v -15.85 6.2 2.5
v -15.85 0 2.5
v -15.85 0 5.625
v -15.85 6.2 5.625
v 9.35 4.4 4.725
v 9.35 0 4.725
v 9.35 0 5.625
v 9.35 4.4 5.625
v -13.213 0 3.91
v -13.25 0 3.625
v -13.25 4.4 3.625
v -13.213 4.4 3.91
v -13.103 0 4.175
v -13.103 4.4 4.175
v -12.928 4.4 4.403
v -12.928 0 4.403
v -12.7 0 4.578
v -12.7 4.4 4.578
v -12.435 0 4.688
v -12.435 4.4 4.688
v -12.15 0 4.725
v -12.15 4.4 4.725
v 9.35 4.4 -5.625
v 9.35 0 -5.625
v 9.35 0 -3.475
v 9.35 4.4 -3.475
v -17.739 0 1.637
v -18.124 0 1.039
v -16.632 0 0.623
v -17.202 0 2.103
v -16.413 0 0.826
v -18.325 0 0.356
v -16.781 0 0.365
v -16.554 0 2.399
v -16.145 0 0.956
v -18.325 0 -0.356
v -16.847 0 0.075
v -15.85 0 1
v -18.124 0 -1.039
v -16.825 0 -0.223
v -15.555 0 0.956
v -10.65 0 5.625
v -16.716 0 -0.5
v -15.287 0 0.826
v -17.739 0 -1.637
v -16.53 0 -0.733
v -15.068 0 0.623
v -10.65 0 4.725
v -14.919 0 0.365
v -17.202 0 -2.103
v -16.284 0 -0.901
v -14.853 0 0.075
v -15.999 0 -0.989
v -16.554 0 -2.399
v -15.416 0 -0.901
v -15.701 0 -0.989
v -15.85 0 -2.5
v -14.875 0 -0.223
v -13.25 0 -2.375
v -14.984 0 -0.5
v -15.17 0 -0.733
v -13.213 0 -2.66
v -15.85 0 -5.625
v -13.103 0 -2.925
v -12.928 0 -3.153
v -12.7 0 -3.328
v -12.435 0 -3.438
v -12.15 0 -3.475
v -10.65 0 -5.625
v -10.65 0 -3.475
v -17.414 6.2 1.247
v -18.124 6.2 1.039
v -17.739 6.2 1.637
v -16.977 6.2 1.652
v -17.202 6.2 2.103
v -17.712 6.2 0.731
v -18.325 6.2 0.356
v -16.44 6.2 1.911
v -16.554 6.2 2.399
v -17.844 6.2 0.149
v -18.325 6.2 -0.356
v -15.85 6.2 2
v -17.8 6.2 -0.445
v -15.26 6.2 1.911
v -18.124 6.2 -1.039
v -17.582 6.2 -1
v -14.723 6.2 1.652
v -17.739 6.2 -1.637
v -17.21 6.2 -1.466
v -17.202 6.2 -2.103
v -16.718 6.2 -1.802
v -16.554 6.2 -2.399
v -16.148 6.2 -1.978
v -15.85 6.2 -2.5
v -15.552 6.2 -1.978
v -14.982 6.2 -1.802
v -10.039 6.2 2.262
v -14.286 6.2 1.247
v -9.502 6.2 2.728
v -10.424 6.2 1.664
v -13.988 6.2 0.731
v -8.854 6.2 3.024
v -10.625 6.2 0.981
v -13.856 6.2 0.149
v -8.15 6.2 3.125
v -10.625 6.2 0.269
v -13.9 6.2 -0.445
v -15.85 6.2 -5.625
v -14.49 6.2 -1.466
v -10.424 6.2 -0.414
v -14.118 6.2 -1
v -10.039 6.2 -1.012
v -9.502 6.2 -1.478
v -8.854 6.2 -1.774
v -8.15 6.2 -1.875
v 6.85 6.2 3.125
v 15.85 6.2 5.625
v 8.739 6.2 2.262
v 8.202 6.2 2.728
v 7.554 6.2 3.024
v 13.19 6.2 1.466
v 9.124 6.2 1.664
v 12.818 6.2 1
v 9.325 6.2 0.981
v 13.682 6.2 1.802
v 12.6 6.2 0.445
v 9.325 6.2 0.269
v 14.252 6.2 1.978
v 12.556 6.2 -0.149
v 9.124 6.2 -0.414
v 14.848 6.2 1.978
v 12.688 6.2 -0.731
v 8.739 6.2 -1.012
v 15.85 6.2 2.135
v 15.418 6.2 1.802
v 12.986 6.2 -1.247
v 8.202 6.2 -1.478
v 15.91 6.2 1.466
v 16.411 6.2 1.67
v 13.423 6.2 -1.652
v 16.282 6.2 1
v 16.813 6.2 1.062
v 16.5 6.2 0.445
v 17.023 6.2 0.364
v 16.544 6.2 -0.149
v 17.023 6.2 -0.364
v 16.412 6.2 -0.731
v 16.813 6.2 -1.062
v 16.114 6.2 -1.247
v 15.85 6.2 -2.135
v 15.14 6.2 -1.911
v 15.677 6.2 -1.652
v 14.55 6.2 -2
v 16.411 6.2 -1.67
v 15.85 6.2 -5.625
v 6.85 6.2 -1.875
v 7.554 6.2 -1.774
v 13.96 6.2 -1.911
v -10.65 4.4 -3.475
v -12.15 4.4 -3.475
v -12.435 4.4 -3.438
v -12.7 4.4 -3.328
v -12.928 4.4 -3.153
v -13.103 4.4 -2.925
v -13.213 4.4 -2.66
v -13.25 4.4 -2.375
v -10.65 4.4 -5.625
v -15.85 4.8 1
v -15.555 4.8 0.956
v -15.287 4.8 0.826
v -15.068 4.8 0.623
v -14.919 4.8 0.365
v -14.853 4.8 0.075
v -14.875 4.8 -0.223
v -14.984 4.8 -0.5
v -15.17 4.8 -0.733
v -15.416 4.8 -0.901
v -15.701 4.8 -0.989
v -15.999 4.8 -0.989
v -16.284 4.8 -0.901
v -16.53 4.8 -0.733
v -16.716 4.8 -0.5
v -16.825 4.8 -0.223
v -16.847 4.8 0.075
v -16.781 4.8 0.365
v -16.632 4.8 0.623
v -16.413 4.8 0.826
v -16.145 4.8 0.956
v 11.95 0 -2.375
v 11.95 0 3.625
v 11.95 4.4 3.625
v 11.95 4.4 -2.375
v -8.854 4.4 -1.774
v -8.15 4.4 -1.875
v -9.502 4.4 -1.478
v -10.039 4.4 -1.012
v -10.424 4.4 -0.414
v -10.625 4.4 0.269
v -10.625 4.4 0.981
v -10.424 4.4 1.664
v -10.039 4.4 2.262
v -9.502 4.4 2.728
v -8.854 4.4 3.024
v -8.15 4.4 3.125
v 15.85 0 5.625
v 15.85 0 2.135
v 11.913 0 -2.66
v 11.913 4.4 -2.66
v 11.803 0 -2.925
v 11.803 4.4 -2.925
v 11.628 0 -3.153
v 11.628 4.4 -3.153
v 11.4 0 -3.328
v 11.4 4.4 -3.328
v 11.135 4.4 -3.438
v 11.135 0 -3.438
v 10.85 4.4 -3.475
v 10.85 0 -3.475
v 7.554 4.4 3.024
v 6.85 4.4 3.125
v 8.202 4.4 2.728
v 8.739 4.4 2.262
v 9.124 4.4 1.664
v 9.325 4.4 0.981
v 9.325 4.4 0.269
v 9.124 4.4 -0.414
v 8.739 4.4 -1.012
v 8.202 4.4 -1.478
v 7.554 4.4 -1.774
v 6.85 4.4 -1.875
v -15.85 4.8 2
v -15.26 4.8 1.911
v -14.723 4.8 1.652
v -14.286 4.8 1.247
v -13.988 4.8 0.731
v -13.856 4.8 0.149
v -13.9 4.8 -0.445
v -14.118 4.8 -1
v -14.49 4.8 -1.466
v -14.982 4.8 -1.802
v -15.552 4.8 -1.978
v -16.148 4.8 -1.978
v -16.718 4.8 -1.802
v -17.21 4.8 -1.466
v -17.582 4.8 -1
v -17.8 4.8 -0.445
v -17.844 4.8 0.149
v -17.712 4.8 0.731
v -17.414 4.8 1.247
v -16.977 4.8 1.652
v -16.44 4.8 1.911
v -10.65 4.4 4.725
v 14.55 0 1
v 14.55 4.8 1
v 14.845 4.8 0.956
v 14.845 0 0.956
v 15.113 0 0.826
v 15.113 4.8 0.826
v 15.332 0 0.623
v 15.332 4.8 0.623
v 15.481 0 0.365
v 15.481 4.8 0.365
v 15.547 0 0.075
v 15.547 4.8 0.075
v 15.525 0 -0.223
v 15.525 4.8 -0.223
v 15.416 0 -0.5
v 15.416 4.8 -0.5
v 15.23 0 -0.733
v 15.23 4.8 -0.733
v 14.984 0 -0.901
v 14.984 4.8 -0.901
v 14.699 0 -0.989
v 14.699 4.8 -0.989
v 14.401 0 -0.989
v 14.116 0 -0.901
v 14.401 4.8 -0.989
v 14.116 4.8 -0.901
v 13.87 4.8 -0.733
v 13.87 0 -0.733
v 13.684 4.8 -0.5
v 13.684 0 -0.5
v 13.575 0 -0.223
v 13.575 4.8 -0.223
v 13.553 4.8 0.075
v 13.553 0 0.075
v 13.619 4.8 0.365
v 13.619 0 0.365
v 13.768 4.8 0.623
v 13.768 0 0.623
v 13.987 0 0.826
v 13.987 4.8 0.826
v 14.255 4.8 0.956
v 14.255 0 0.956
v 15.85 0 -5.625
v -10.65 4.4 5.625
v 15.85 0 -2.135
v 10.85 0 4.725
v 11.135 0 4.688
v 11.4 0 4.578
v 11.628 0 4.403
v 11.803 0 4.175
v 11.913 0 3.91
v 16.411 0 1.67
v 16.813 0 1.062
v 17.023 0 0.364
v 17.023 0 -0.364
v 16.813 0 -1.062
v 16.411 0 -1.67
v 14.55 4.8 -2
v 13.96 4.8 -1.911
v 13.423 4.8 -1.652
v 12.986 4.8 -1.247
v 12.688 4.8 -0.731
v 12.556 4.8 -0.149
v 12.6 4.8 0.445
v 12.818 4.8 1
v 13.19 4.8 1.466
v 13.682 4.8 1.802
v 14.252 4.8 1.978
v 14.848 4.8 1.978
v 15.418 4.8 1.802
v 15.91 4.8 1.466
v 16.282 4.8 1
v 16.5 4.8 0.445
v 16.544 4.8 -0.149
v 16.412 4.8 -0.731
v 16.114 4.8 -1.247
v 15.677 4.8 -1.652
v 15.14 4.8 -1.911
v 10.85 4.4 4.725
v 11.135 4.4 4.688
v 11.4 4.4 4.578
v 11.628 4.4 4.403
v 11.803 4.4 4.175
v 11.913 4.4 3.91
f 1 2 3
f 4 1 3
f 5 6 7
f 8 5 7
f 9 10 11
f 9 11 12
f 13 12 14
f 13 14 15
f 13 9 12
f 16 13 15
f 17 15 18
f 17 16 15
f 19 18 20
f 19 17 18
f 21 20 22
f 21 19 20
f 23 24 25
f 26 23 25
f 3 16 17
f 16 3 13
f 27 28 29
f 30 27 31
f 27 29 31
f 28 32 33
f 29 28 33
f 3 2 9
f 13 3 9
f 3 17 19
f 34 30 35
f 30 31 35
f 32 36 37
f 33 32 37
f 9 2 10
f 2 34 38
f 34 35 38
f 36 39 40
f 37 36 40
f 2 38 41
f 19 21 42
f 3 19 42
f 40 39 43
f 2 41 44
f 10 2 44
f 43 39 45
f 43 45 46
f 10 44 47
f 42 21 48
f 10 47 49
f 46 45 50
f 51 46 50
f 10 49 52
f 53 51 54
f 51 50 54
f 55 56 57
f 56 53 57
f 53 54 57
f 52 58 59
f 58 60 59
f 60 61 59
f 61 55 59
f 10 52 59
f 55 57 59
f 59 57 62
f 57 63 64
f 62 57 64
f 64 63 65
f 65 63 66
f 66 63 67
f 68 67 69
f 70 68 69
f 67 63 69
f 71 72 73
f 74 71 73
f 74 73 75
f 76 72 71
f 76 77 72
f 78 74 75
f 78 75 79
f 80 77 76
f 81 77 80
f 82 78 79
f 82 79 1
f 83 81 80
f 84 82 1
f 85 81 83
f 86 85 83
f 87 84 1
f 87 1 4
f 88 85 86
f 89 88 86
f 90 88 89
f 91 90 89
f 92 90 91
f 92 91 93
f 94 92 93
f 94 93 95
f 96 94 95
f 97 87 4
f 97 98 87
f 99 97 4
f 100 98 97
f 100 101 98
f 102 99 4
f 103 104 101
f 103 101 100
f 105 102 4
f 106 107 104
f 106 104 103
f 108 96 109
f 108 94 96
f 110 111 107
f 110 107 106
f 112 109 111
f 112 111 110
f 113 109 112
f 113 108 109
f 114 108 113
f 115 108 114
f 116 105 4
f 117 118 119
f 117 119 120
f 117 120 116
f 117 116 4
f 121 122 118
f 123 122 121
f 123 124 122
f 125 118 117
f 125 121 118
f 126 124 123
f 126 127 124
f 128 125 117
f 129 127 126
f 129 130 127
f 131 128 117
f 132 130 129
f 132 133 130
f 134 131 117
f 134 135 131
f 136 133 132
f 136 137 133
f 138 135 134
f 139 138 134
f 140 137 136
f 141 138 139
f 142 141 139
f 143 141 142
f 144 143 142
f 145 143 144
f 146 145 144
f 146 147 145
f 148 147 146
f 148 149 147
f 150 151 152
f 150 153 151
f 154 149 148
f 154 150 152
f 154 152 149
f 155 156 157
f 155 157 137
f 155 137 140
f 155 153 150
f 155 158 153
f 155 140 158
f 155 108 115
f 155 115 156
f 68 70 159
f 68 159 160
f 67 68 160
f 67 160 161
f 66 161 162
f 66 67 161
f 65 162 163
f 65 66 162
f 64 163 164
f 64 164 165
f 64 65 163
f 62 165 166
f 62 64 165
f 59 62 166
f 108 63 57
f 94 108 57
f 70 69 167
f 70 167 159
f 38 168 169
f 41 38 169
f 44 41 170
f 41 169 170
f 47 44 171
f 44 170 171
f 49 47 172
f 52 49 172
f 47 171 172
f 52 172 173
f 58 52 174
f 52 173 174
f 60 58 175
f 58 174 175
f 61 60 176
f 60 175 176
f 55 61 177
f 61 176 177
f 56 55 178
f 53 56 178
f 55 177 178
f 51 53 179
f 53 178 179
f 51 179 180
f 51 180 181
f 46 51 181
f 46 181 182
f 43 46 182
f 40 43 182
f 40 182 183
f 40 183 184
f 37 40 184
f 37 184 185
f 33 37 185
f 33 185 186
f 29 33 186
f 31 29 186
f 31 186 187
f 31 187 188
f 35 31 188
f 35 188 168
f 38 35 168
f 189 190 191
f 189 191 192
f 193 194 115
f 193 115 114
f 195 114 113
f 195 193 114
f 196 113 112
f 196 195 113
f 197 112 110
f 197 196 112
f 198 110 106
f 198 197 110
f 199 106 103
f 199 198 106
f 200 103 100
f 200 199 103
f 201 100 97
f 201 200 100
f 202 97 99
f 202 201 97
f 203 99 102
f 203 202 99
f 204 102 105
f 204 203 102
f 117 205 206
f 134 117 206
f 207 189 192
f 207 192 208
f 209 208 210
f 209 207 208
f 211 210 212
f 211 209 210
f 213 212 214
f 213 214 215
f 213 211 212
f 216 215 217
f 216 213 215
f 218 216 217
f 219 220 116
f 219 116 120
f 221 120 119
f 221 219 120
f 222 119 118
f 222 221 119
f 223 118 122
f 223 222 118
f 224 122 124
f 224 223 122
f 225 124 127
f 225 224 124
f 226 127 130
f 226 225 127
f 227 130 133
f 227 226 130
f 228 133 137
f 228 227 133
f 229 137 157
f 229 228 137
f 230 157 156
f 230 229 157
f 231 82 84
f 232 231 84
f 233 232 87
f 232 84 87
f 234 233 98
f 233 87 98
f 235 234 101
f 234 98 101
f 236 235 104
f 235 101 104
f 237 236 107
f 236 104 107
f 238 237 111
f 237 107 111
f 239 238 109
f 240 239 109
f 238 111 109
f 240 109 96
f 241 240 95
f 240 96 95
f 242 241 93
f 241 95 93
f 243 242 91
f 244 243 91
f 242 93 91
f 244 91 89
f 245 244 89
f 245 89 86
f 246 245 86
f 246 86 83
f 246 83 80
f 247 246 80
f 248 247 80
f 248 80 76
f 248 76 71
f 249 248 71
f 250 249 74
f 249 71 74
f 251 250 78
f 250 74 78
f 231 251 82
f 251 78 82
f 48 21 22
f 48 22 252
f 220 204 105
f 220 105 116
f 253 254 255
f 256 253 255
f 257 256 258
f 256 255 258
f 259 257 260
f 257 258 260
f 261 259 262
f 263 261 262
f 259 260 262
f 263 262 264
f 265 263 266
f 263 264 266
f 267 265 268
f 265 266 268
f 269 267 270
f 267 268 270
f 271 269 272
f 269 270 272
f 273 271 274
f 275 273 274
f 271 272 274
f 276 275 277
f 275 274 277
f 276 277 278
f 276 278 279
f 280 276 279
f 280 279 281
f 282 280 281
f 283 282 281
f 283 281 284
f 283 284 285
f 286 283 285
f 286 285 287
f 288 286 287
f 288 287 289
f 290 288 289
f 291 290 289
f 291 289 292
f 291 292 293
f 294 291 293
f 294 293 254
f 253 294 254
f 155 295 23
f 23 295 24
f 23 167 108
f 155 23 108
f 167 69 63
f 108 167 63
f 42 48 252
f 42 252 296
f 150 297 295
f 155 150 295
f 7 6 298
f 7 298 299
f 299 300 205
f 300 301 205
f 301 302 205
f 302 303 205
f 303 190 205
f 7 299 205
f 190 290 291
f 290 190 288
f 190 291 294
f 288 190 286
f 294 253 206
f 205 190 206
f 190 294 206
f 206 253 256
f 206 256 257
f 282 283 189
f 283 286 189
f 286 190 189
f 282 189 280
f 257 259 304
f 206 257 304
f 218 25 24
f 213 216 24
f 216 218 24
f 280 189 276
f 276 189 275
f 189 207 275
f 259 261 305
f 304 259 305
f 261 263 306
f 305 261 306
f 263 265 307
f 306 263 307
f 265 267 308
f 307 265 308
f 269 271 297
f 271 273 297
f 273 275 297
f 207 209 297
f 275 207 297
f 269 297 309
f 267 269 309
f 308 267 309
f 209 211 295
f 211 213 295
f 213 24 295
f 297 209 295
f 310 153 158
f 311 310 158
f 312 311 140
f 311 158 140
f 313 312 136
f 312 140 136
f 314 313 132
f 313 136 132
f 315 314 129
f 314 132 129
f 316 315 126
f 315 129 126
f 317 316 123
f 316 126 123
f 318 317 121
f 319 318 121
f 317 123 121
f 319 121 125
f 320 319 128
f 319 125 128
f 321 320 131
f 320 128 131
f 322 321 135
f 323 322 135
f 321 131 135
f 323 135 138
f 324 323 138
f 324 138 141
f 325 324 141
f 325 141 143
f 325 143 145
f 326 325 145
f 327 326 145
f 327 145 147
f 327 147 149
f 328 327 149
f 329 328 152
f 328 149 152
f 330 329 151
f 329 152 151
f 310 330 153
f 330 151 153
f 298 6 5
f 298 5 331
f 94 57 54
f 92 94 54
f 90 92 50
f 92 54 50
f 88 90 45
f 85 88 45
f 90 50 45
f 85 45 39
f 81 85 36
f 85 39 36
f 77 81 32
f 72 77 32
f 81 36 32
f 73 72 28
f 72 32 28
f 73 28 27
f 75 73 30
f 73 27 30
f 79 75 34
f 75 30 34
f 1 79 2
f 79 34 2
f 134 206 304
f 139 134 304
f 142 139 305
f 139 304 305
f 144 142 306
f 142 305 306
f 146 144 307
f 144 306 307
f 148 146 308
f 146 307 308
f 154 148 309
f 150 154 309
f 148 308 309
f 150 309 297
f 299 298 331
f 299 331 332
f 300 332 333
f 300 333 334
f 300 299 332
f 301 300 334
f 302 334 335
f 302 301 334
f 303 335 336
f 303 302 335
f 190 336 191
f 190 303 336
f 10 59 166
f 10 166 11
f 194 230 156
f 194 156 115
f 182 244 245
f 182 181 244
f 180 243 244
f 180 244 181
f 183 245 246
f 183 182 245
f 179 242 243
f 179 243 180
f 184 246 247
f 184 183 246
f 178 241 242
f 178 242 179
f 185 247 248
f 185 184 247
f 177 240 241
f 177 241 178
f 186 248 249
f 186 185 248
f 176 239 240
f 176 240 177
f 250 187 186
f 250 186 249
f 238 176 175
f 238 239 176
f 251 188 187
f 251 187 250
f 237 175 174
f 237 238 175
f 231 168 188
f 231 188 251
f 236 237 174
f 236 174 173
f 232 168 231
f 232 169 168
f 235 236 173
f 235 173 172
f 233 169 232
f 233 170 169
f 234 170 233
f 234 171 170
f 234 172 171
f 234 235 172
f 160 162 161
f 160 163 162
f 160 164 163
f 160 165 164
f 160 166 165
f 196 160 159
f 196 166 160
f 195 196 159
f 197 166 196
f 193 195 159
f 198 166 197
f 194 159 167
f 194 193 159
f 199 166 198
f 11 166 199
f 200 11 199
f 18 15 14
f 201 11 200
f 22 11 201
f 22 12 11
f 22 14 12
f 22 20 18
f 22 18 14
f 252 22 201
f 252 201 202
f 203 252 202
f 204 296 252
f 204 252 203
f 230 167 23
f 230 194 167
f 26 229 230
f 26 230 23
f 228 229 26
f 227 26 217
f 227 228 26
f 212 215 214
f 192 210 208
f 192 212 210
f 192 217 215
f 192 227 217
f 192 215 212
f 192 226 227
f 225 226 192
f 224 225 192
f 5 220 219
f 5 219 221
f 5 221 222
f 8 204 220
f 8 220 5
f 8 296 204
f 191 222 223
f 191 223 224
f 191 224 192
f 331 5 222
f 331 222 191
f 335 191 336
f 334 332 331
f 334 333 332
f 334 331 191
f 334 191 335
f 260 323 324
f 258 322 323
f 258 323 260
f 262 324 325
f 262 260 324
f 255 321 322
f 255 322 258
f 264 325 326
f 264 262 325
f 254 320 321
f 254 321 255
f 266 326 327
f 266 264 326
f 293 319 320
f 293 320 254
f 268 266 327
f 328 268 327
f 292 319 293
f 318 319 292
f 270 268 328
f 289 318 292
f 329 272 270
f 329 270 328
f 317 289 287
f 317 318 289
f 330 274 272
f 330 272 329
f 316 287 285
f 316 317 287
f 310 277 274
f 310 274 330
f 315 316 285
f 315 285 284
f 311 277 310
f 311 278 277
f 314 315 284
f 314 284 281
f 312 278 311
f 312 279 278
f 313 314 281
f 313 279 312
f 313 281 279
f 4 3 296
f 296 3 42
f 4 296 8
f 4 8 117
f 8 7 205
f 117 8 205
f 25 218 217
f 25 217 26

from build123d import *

# Parameters (mm, degrees)
EXTRUDE_1_DEPTH     = 6.2
SKETCH_2_W          = 20
SKETCH_2_H          = 11.25
CUT_EXTRUDE_1_DEPTH = 4.4
CUT_EXTRUDE_2_DEPTH = 4.4
SKETCH_4_R          = 1
CUT_EXTRUDE_3_DEPTH = 21.169361046
SKETCH_5_R          = 2
CUT_EXTRUDE_4_DEPTH = 1.4
CUT_EXTRUDE_5_DEPTH = 4.4
CUT_EXTRUDE_6_DEPTH = 4.2


with BuildPart() as part:
    # 草图1 → 凸台-拉伸1 (new body)
    with BuildSketch(Plane(origin=(0, 0, 0), x_dir=(1, 0, 0), z_dir=(0, 1, 0))):
        with BuildLine():
            Line((-15.85, -5.625), (15.85, -5.625))
            Line((15.85, -5.625), (15.85, -2.13541565))
            ThreePointArc((15.85, -2.13541565), (17.05, 0), (15.85, 2.13541565))
            Line((15.85, 2.13541565), (15.85, 5.625))
            Line((15.85, 5.625), (-15.85, 5.625))
            Line((-15.85, 5.625), (-15.85, 2.5))
            ThreePointArc((-15.85, 2.5), (-18.35, 0), (-15.85, -2.5))
            Line((-15.85, -2.5), (-15.85, -5.625))
        make_face()
    extrude(amount=EXTRUDE_1_DEPTH)

    # 草图2 → 切除-拉伸1 (cut)
    with BuildSketch(Plane.XZ):
        with Locations((-0.65, 0)):
            Rectangle(SKETCH_2_W, SKETCH_2_H)
    extrude(amount=-CUT_EXTRUDE_1_DEPTH, mode=Mode.SUBTRACT)

    # 草图3 → 切除-拉伸2 (cut)
    with BuildSketch(Plane.XZ):
        with BuildLine():
            Line((-12.15, 4.625), (10.85, 4.625))
            ThreePointArc((10.85, 4.625), (11.557106781, 4.332106781), (11.85, 3.625))
            Line((11.85, 3.625), (11.85, -2.375))
            ThreePointArc((11.85, -2.375), (11.557106781, -3.082106781), (10.85, -3.375))
            Line((10.85, -3.375), (-12.15, -3.375))
            ThreePointArc((-12.15, -3.375), (-12.857106781, -3.082106781), (-13.15, -2.375))
            Line((-13.15, -2.375), (-13.15, 3.625))
            ThreePointArc((-13.15, 3.625), (-12.857106781, 4.332106781), (-12.15, 4.625))
        make_face()
    extrude(amount=-CUT_EXTRUDE_2_DEPTH, mode=Mode.SUBTRACT)

    # 草图4 → 切除-拉伸3 (cut, through all)
    with BuildSketch(Plane(origin=(0, 6.2, 0), x_dir=(1, 0, 0), z_dir=(0, 1, 0))):
        with Locations((-15.85, 0)):
            Circle(SKETCH_4_R)
        with Locations((14.55, 0)):
            Circle(SKETCH_4_R)
    extrude(amount=-CUT_EXTRUDE_3_DEPTH, mode=Mode.SUBTRACT)

    # 草图5 → 切除-拉伸4 (cut)
    with BuildSketch(Plane(origin=(0, 6.2, 0), x_dir=(1, 0, 0), z_dir=(0, 1, 0))):
        with Locations((-15.85, 0)):
            Circle(SKETCH_5_R)
        with Locations((14.55, 0)):
            Circle(SKETCH_5_R)
    extrude(amount=-CUT_EXTRUDE_4_DEPTH, mode=Mode.SUBTRACT)

    # 草图6 → 切除-拉伸5 (cut)
    with BuildSketch(Plane.XZ):
        with BuildLine():
            Line((11.95, 3.625), (11.95, -2.375))
            ThreePointArc((11.95, -2.375), (11.627817459, -3.152817459), (10.85, -3.475))
            Line((10.85, -3.475), (-12.15, -3.475))
            ThreePointArc((-12.15, -3.475), (-12.927817459, -3.152817459), (-13.25, -2.375))
            Line((-13.25, -2.375), (-13.25, 3.625))
            ThreePointArc((-13.25, 3.625), (-12.927817459, 4.402817459), (-12.15, 4.725))
            Line((-12.15, 4.725), (10.85, 4.725))
            ThreePointArc((10.85, 4.725), (11.627817459, 4.402817459), (11.95, 3.625))
        make_face()
    extrude(amount=-CUT_EXTRUDE_5_DEPTH, mode=Mode.SUBTRACT)

    # 草图7 → 切除-拉伸6 (cut)
    with BuildSketch(Plane.XZ.offset(-4.4)):
        with BuildLine():
            Line((-8.15, 3.125), (6.85, 3.125))
            ThreePointArc((6.85, 3.125), (9.35, 0.625), (6.85, -1.875))
            Line((6.85, -1.875), (-8.15, -1.875))
            ThreePointArc((-8.15, -1.875), (-10.65, 0.625), (-8.15, 3.125))
        make_face()
    extrude(amount=-CUT_EXTRUDE_6_DEPTH, mode=Mode.SUBTRACT)


solid = part.part
